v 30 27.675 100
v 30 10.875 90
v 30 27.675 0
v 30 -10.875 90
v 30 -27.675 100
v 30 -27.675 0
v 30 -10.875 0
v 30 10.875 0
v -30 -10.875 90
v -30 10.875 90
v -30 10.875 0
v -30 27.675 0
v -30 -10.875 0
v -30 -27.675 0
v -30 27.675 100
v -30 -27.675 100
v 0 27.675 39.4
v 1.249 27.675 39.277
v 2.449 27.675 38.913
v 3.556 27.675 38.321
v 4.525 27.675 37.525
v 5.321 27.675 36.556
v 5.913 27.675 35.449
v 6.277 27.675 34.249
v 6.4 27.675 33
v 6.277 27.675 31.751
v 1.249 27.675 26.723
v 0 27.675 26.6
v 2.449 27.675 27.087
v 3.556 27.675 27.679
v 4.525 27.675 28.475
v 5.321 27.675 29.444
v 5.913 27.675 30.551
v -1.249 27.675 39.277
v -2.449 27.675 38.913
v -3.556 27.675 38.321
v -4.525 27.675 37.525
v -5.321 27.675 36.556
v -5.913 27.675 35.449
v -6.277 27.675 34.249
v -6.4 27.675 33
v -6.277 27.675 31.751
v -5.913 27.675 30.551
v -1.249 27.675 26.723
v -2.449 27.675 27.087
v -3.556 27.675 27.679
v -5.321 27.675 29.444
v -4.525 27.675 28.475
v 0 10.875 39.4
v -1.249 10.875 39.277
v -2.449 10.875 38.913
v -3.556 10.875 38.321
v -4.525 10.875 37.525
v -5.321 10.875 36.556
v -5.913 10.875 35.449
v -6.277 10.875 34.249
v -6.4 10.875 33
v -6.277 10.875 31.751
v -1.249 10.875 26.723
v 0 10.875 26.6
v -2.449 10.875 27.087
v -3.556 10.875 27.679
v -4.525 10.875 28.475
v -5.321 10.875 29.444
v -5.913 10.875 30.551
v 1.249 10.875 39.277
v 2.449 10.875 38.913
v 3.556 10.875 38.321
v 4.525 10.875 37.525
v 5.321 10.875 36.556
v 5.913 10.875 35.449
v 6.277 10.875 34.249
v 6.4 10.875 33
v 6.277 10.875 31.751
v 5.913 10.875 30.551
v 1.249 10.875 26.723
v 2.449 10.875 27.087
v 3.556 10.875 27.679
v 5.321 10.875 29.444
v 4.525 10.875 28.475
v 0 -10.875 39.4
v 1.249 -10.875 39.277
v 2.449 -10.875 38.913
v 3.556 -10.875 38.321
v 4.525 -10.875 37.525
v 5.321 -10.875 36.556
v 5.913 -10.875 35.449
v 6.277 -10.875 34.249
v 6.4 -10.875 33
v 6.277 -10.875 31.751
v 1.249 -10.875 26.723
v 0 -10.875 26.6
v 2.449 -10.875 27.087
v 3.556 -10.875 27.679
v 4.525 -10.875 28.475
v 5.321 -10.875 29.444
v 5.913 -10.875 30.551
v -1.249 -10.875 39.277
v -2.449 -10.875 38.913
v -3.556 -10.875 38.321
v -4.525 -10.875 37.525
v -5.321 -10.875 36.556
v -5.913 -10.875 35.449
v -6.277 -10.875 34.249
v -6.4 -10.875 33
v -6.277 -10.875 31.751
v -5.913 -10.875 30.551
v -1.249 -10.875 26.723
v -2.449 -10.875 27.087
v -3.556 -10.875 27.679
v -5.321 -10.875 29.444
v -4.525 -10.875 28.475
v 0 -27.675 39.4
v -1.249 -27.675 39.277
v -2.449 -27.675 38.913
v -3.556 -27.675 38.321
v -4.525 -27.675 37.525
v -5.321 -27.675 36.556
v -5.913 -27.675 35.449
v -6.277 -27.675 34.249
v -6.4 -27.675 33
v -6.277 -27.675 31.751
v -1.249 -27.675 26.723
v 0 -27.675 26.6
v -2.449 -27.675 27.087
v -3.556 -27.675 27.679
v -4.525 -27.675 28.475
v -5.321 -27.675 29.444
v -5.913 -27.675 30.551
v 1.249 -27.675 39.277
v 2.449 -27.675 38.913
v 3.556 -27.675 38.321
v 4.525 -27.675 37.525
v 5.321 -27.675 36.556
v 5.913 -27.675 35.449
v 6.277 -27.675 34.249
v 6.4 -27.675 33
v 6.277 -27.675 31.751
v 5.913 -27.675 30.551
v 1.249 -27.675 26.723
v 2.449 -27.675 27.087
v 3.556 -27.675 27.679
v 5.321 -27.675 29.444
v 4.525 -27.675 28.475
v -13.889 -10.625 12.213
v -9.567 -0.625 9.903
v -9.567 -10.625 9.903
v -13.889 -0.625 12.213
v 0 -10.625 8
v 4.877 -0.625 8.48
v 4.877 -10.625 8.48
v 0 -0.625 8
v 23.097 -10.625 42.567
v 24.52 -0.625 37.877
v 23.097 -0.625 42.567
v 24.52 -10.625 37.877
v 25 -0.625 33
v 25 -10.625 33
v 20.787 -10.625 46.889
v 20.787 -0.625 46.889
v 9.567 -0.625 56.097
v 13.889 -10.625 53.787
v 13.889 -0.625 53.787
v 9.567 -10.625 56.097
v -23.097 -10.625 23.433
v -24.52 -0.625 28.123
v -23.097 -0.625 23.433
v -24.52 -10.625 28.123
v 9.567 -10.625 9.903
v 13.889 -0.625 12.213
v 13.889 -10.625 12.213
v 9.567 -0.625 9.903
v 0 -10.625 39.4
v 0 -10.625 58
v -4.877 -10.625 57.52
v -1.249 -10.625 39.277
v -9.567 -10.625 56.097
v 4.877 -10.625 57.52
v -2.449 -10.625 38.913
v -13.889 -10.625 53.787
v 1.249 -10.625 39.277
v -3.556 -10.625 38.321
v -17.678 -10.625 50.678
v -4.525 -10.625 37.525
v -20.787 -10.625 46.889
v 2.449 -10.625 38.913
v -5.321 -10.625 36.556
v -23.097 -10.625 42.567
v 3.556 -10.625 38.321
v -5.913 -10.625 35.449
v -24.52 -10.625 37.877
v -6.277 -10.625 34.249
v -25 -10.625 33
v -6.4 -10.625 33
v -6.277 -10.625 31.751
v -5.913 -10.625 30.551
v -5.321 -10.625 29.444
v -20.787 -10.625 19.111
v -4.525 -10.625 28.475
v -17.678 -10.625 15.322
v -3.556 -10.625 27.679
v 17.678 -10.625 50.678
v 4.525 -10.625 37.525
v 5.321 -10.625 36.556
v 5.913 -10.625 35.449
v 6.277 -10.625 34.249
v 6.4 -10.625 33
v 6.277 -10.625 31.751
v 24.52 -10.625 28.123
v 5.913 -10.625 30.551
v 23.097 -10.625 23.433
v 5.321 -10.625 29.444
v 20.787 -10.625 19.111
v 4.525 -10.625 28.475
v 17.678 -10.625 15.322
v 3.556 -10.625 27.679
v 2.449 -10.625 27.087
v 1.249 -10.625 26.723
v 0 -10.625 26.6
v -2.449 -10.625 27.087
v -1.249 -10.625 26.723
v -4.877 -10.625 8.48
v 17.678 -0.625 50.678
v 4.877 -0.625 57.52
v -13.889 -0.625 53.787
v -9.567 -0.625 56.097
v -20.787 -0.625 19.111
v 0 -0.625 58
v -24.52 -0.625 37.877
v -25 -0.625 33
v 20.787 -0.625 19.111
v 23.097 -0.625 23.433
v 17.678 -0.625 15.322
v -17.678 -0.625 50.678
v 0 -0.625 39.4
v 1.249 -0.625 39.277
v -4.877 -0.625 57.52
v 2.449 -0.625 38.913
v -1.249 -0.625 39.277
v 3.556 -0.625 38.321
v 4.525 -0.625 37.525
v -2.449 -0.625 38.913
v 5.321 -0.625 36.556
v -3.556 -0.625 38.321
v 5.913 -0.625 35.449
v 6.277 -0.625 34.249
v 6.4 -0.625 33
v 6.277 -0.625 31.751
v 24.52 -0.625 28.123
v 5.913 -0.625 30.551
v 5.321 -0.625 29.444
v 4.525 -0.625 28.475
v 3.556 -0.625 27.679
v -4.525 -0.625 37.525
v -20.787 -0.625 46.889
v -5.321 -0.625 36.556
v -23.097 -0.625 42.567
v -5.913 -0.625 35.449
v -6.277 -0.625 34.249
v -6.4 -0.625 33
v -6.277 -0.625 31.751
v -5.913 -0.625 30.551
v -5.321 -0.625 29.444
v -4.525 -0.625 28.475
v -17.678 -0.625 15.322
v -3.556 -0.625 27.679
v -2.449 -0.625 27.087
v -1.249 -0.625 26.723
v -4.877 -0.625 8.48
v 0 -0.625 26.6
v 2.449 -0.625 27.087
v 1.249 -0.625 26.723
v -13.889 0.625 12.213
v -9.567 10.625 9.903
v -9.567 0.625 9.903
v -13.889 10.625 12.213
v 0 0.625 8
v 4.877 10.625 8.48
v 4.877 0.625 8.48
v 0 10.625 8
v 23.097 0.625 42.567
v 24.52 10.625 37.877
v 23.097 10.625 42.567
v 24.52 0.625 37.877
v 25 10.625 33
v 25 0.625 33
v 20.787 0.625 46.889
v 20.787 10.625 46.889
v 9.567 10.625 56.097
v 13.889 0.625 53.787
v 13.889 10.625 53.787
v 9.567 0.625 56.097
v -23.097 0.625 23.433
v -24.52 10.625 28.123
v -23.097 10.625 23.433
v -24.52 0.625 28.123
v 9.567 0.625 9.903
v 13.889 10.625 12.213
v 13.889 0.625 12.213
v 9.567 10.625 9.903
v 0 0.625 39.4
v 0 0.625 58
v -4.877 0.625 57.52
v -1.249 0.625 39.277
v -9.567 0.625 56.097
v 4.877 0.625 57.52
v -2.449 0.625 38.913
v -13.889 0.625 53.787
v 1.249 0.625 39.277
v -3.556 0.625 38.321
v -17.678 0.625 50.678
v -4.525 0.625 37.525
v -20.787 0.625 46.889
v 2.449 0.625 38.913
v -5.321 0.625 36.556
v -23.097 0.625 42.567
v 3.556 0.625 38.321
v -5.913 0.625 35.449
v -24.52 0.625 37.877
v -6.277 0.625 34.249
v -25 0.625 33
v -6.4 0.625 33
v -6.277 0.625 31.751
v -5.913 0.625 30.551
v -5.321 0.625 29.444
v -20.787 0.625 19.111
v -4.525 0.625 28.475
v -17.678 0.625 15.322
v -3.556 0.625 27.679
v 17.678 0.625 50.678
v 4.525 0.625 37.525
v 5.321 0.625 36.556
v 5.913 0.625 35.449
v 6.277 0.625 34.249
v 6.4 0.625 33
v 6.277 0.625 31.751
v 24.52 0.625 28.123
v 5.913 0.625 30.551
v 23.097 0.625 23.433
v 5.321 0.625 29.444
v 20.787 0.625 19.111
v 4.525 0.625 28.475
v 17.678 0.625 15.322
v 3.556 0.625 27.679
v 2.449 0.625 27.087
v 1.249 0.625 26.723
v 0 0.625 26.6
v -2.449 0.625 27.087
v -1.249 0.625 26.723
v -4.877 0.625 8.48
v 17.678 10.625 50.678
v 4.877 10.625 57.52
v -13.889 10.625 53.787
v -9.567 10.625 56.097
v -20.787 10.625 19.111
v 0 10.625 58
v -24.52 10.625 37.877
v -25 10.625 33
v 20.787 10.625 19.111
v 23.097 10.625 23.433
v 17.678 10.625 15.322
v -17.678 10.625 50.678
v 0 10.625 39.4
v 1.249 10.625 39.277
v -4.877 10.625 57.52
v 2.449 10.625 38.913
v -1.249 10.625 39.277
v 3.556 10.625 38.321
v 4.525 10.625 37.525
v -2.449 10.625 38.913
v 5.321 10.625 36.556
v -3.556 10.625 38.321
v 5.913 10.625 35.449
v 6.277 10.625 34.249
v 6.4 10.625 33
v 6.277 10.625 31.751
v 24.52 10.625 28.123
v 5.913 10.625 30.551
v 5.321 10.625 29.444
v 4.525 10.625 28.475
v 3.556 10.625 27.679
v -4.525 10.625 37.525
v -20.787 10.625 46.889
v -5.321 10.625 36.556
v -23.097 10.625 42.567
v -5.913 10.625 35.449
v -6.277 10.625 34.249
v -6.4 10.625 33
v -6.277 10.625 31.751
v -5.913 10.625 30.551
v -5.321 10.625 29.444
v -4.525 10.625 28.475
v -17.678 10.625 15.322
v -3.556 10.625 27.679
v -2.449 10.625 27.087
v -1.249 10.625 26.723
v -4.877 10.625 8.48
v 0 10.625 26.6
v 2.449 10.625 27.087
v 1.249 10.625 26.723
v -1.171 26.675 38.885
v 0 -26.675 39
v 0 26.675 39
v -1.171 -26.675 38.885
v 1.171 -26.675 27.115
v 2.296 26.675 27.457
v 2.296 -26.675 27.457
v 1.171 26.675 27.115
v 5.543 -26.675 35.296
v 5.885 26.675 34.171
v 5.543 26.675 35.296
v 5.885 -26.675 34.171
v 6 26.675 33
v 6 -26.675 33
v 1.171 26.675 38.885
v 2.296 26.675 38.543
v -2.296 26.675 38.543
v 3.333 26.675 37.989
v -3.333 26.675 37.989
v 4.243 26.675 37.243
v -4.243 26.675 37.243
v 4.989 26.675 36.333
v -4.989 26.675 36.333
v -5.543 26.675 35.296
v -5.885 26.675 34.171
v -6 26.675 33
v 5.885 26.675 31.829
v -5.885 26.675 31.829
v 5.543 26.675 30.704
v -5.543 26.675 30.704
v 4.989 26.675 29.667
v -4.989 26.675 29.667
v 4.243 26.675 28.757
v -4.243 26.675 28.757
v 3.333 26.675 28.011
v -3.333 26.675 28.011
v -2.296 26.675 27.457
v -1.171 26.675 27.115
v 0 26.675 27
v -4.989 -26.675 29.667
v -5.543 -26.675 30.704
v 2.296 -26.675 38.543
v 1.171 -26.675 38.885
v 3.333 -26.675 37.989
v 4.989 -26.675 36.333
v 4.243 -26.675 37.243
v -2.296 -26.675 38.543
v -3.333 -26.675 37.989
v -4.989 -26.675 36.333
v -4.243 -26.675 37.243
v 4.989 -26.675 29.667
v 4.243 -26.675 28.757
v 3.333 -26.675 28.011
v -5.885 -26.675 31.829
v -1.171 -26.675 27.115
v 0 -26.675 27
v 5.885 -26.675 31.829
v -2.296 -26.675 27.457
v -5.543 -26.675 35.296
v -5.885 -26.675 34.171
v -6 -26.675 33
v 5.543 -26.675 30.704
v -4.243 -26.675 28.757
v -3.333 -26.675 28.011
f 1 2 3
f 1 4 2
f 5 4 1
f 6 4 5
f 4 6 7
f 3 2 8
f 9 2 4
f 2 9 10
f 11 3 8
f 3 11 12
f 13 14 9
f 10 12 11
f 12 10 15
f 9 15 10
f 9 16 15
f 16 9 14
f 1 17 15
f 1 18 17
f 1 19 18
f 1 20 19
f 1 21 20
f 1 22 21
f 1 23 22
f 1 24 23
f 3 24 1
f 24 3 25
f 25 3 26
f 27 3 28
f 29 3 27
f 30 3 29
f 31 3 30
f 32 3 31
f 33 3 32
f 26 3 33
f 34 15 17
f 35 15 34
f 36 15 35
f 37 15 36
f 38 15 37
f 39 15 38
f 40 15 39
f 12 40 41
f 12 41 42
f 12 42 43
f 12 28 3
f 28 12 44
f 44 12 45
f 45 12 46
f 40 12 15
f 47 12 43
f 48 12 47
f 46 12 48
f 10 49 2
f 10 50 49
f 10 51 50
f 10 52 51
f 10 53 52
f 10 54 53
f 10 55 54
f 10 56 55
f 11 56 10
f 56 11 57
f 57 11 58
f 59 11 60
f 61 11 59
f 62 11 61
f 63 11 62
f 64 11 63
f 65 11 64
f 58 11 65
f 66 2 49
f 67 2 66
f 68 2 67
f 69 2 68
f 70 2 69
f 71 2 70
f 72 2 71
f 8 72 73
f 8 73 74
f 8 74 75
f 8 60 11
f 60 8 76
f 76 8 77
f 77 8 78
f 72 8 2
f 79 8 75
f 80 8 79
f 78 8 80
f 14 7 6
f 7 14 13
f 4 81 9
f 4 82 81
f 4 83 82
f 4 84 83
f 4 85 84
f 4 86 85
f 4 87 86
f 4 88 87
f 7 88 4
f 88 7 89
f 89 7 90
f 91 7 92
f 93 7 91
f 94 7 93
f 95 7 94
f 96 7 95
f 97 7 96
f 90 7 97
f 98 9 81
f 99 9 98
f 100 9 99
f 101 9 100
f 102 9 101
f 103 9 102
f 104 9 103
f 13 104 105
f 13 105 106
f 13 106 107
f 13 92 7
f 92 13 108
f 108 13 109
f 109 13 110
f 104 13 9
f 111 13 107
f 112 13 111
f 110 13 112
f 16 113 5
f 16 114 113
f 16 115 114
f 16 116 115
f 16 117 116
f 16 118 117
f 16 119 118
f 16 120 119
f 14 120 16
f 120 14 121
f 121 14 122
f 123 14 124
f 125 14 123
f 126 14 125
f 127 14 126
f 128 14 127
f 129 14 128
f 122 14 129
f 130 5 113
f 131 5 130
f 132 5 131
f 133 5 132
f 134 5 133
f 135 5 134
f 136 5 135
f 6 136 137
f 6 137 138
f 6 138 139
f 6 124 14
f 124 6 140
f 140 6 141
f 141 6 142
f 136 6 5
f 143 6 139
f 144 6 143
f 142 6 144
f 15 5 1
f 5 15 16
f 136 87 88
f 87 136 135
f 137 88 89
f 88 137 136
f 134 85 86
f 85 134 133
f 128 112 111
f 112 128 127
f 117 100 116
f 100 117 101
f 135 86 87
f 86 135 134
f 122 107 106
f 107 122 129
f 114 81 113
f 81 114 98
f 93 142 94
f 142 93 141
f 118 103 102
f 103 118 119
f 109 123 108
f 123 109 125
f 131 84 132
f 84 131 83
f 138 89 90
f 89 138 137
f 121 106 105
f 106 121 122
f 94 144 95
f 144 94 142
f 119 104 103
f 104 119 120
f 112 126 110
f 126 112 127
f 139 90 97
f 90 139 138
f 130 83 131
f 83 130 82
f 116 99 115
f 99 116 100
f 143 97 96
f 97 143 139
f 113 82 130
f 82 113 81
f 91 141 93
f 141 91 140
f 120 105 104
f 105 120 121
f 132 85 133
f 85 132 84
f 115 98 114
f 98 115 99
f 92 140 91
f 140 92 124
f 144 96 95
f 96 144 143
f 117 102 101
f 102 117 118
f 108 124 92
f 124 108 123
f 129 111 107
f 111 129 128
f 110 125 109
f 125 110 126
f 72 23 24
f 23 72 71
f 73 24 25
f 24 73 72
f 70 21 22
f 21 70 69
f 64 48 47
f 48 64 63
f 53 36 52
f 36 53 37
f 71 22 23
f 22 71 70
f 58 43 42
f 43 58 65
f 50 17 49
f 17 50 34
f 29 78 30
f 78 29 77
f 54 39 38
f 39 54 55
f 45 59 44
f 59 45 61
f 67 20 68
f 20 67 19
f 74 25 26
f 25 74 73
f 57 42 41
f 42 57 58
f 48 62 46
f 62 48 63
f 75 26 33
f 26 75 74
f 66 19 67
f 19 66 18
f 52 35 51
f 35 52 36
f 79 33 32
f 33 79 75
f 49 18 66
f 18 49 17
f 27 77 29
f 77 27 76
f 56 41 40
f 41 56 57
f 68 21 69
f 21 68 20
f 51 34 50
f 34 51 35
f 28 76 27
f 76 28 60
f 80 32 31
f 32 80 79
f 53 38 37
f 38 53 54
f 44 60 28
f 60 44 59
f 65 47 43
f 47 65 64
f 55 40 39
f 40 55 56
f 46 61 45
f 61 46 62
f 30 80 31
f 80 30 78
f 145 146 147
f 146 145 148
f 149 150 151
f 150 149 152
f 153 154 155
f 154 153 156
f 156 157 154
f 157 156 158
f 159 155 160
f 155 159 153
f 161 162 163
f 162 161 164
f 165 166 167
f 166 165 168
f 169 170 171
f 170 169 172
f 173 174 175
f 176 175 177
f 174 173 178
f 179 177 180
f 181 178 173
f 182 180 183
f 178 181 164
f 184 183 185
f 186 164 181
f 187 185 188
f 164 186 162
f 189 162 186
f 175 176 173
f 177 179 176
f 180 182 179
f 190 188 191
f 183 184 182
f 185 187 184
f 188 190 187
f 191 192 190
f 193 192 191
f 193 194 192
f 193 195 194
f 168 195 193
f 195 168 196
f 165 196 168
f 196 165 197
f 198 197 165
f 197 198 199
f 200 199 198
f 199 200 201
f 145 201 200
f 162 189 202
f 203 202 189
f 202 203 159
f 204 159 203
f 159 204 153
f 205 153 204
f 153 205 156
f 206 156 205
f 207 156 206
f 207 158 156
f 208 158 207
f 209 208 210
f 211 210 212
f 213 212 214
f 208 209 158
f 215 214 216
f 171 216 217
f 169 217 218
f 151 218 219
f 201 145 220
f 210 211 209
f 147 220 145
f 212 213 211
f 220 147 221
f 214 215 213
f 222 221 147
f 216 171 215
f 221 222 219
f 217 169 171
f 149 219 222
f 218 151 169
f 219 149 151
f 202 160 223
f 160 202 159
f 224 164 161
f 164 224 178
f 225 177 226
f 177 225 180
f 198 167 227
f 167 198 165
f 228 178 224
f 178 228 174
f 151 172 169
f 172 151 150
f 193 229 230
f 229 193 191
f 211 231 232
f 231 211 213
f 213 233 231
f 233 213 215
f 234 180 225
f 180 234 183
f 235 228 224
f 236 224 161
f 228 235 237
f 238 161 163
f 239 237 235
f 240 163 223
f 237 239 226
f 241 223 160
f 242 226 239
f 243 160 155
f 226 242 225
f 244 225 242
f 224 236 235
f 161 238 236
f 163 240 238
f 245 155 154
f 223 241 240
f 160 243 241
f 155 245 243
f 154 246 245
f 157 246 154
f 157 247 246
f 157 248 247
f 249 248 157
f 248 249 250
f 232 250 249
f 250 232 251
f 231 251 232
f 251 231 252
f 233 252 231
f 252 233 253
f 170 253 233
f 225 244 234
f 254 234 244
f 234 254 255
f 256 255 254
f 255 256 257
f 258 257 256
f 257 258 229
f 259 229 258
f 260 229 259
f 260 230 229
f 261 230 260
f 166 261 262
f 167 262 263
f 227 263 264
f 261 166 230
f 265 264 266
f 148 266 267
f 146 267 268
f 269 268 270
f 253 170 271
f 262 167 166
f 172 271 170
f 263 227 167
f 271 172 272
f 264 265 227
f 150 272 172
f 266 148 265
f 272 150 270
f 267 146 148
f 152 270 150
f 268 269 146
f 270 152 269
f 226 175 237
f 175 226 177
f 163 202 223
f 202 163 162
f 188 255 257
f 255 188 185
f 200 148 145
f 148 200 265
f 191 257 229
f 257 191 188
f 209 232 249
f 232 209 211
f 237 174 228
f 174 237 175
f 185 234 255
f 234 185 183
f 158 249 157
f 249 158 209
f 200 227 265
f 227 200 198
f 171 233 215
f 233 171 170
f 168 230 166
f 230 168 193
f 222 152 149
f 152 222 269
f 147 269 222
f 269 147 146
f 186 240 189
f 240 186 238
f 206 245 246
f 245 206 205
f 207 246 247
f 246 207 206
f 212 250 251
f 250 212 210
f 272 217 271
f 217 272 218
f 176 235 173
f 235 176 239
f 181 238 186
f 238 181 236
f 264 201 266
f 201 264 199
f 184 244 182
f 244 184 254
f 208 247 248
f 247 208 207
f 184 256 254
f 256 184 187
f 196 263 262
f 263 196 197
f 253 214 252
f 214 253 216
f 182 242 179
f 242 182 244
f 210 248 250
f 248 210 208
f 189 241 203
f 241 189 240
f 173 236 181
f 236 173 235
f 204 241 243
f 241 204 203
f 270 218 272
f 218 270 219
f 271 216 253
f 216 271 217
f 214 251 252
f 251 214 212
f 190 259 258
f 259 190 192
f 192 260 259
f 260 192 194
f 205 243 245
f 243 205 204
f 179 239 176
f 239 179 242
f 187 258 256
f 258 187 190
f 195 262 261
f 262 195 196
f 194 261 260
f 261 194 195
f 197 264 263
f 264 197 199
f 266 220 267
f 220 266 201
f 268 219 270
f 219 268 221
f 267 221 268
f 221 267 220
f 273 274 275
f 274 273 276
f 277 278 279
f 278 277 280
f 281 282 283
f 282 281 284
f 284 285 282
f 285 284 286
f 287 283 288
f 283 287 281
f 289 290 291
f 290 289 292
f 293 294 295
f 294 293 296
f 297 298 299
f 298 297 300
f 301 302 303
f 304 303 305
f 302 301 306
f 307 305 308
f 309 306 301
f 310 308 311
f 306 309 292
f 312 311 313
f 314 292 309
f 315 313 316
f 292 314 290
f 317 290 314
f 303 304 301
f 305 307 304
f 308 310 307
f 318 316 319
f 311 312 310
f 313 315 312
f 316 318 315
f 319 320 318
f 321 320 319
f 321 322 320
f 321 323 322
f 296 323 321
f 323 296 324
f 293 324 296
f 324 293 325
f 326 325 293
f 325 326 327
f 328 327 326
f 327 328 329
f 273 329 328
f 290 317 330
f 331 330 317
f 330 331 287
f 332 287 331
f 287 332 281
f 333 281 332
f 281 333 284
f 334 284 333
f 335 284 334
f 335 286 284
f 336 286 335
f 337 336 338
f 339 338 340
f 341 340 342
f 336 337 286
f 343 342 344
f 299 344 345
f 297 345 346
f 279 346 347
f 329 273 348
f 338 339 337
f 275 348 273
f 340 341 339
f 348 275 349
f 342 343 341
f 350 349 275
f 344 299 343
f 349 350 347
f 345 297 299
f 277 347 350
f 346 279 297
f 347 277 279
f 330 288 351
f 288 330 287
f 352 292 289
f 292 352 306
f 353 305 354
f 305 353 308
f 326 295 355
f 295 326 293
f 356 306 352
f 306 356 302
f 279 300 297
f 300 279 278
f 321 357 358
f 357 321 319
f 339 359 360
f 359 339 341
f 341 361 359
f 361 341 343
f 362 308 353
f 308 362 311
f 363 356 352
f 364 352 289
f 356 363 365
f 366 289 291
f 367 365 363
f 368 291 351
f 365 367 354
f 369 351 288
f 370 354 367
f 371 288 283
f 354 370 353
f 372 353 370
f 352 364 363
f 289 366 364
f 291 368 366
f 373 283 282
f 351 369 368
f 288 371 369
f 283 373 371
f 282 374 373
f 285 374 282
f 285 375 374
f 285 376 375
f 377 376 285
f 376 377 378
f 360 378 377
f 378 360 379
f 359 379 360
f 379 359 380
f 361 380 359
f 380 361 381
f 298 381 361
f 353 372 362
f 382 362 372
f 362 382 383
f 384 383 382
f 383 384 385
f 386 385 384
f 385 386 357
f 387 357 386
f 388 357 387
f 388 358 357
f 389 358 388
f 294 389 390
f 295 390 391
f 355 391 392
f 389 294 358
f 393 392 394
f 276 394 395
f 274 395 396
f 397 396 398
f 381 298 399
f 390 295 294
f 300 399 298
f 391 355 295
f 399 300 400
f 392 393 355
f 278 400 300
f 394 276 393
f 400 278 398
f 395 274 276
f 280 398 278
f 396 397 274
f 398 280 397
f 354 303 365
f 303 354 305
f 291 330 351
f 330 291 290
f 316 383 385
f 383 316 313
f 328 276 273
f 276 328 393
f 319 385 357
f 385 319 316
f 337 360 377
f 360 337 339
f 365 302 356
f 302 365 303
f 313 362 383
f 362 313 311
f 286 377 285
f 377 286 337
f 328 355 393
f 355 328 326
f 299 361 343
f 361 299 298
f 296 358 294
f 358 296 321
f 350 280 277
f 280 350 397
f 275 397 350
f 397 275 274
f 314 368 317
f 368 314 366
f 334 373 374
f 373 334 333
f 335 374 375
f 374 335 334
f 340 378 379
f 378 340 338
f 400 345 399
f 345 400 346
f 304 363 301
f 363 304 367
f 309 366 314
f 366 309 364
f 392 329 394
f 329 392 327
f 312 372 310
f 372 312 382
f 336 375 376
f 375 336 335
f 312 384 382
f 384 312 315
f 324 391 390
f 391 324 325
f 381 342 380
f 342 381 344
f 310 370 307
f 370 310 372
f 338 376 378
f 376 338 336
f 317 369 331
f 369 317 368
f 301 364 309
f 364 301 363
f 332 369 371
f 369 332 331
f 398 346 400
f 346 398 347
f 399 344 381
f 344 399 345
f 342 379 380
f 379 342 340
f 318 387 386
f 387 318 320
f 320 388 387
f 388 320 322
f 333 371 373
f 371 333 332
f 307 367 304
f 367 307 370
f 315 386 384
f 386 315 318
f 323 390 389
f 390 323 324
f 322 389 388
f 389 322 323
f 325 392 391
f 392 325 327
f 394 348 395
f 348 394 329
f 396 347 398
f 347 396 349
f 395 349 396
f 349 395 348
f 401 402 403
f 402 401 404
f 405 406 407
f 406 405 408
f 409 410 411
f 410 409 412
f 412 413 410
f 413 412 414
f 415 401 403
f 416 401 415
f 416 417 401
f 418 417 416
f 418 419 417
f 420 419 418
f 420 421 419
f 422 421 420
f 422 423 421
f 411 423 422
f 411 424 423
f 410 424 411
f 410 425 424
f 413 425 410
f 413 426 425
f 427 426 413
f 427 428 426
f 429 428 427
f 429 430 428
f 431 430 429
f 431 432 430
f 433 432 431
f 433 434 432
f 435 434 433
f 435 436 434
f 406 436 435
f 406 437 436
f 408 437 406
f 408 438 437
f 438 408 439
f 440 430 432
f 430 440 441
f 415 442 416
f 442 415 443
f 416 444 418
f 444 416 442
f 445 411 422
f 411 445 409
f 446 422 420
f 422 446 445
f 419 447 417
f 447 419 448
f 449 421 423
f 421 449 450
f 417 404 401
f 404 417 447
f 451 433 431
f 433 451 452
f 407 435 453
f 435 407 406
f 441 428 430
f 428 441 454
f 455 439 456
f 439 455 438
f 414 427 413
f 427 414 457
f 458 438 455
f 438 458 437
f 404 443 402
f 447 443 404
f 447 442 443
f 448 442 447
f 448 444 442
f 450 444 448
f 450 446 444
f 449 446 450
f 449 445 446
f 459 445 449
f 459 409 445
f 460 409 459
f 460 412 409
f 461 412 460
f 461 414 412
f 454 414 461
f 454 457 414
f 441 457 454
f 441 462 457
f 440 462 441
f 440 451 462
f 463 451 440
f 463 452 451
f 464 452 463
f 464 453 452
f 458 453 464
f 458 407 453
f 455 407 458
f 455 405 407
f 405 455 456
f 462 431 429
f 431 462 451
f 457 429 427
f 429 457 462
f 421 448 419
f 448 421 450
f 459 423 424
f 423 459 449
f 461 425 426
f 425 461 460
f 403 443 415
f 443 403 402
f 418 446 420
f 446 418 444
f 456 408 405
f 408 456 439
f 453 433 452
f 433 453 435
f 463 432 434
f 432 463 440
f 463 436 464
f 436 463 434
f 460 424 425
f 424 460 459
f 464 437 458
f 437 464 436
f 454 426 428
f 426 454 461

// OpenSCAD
$fn = 32;

// ------------------------------------------------------------------------
// Trolley wheel set: wheels d50, fork 90 mm tall
// Every part is its own module, assembly() places every instance.
// ------------------------------------------------------------------------

// --- part 1 ---
module trolley_fork() {
  difference() {
    union() {
      translate([-30, 10.875, 0]) cube([60, 16.8, 90]);
      translate([-30, -27.675, 0]) cube([60, 16.8, 90]);
      translate([-30, -27.675, 90]) cube([60, 55.35, 10]);
    }
    translate([0, -19.275, 33]) rotate([90, 0, 0]) cylinder(h = 18.8, d = 12.8, center = true);
    translate([0, 19.275, 33]) rotate([90, 0, 0]) cylinder(h = 18.8, d = 12.8, center = true);
  }
}

// --- part 2 ---
module trolley_wheel() {
  difference() {
      translate([0, 0, 0]) cylinder(h = 10, d = 50);
      translate([0, 0, -1]) cylinder(h = 12, d = 12.8);
    }
}

// --- part 3 ---
module trolley_axle() {
  translate([0, 0, -26.675]) cylinder(h = 53.35, d = 12);
}

// --- assembly ---
module assembly() {
  color([0.80, 0.24, 0.20]) translate([0, 0, 0]) rotate([0, 0, 0]) trolley_fork();
  color([0.20, 0.45, 0.75]) translate([0, -0.625, 33]) rotate([90, 0, 0]) trolley_wheel();
  color([0.25, 0.62, 0.32]) translate([0, 10.625, 33]) rotate([90, 0, 0]) trolley_wheel();
  color([0.92, 0.70, 0.18]) translate([0, 0, 33]) rotate([90, 0, 0]) trolley_axle();
}

assembly();
